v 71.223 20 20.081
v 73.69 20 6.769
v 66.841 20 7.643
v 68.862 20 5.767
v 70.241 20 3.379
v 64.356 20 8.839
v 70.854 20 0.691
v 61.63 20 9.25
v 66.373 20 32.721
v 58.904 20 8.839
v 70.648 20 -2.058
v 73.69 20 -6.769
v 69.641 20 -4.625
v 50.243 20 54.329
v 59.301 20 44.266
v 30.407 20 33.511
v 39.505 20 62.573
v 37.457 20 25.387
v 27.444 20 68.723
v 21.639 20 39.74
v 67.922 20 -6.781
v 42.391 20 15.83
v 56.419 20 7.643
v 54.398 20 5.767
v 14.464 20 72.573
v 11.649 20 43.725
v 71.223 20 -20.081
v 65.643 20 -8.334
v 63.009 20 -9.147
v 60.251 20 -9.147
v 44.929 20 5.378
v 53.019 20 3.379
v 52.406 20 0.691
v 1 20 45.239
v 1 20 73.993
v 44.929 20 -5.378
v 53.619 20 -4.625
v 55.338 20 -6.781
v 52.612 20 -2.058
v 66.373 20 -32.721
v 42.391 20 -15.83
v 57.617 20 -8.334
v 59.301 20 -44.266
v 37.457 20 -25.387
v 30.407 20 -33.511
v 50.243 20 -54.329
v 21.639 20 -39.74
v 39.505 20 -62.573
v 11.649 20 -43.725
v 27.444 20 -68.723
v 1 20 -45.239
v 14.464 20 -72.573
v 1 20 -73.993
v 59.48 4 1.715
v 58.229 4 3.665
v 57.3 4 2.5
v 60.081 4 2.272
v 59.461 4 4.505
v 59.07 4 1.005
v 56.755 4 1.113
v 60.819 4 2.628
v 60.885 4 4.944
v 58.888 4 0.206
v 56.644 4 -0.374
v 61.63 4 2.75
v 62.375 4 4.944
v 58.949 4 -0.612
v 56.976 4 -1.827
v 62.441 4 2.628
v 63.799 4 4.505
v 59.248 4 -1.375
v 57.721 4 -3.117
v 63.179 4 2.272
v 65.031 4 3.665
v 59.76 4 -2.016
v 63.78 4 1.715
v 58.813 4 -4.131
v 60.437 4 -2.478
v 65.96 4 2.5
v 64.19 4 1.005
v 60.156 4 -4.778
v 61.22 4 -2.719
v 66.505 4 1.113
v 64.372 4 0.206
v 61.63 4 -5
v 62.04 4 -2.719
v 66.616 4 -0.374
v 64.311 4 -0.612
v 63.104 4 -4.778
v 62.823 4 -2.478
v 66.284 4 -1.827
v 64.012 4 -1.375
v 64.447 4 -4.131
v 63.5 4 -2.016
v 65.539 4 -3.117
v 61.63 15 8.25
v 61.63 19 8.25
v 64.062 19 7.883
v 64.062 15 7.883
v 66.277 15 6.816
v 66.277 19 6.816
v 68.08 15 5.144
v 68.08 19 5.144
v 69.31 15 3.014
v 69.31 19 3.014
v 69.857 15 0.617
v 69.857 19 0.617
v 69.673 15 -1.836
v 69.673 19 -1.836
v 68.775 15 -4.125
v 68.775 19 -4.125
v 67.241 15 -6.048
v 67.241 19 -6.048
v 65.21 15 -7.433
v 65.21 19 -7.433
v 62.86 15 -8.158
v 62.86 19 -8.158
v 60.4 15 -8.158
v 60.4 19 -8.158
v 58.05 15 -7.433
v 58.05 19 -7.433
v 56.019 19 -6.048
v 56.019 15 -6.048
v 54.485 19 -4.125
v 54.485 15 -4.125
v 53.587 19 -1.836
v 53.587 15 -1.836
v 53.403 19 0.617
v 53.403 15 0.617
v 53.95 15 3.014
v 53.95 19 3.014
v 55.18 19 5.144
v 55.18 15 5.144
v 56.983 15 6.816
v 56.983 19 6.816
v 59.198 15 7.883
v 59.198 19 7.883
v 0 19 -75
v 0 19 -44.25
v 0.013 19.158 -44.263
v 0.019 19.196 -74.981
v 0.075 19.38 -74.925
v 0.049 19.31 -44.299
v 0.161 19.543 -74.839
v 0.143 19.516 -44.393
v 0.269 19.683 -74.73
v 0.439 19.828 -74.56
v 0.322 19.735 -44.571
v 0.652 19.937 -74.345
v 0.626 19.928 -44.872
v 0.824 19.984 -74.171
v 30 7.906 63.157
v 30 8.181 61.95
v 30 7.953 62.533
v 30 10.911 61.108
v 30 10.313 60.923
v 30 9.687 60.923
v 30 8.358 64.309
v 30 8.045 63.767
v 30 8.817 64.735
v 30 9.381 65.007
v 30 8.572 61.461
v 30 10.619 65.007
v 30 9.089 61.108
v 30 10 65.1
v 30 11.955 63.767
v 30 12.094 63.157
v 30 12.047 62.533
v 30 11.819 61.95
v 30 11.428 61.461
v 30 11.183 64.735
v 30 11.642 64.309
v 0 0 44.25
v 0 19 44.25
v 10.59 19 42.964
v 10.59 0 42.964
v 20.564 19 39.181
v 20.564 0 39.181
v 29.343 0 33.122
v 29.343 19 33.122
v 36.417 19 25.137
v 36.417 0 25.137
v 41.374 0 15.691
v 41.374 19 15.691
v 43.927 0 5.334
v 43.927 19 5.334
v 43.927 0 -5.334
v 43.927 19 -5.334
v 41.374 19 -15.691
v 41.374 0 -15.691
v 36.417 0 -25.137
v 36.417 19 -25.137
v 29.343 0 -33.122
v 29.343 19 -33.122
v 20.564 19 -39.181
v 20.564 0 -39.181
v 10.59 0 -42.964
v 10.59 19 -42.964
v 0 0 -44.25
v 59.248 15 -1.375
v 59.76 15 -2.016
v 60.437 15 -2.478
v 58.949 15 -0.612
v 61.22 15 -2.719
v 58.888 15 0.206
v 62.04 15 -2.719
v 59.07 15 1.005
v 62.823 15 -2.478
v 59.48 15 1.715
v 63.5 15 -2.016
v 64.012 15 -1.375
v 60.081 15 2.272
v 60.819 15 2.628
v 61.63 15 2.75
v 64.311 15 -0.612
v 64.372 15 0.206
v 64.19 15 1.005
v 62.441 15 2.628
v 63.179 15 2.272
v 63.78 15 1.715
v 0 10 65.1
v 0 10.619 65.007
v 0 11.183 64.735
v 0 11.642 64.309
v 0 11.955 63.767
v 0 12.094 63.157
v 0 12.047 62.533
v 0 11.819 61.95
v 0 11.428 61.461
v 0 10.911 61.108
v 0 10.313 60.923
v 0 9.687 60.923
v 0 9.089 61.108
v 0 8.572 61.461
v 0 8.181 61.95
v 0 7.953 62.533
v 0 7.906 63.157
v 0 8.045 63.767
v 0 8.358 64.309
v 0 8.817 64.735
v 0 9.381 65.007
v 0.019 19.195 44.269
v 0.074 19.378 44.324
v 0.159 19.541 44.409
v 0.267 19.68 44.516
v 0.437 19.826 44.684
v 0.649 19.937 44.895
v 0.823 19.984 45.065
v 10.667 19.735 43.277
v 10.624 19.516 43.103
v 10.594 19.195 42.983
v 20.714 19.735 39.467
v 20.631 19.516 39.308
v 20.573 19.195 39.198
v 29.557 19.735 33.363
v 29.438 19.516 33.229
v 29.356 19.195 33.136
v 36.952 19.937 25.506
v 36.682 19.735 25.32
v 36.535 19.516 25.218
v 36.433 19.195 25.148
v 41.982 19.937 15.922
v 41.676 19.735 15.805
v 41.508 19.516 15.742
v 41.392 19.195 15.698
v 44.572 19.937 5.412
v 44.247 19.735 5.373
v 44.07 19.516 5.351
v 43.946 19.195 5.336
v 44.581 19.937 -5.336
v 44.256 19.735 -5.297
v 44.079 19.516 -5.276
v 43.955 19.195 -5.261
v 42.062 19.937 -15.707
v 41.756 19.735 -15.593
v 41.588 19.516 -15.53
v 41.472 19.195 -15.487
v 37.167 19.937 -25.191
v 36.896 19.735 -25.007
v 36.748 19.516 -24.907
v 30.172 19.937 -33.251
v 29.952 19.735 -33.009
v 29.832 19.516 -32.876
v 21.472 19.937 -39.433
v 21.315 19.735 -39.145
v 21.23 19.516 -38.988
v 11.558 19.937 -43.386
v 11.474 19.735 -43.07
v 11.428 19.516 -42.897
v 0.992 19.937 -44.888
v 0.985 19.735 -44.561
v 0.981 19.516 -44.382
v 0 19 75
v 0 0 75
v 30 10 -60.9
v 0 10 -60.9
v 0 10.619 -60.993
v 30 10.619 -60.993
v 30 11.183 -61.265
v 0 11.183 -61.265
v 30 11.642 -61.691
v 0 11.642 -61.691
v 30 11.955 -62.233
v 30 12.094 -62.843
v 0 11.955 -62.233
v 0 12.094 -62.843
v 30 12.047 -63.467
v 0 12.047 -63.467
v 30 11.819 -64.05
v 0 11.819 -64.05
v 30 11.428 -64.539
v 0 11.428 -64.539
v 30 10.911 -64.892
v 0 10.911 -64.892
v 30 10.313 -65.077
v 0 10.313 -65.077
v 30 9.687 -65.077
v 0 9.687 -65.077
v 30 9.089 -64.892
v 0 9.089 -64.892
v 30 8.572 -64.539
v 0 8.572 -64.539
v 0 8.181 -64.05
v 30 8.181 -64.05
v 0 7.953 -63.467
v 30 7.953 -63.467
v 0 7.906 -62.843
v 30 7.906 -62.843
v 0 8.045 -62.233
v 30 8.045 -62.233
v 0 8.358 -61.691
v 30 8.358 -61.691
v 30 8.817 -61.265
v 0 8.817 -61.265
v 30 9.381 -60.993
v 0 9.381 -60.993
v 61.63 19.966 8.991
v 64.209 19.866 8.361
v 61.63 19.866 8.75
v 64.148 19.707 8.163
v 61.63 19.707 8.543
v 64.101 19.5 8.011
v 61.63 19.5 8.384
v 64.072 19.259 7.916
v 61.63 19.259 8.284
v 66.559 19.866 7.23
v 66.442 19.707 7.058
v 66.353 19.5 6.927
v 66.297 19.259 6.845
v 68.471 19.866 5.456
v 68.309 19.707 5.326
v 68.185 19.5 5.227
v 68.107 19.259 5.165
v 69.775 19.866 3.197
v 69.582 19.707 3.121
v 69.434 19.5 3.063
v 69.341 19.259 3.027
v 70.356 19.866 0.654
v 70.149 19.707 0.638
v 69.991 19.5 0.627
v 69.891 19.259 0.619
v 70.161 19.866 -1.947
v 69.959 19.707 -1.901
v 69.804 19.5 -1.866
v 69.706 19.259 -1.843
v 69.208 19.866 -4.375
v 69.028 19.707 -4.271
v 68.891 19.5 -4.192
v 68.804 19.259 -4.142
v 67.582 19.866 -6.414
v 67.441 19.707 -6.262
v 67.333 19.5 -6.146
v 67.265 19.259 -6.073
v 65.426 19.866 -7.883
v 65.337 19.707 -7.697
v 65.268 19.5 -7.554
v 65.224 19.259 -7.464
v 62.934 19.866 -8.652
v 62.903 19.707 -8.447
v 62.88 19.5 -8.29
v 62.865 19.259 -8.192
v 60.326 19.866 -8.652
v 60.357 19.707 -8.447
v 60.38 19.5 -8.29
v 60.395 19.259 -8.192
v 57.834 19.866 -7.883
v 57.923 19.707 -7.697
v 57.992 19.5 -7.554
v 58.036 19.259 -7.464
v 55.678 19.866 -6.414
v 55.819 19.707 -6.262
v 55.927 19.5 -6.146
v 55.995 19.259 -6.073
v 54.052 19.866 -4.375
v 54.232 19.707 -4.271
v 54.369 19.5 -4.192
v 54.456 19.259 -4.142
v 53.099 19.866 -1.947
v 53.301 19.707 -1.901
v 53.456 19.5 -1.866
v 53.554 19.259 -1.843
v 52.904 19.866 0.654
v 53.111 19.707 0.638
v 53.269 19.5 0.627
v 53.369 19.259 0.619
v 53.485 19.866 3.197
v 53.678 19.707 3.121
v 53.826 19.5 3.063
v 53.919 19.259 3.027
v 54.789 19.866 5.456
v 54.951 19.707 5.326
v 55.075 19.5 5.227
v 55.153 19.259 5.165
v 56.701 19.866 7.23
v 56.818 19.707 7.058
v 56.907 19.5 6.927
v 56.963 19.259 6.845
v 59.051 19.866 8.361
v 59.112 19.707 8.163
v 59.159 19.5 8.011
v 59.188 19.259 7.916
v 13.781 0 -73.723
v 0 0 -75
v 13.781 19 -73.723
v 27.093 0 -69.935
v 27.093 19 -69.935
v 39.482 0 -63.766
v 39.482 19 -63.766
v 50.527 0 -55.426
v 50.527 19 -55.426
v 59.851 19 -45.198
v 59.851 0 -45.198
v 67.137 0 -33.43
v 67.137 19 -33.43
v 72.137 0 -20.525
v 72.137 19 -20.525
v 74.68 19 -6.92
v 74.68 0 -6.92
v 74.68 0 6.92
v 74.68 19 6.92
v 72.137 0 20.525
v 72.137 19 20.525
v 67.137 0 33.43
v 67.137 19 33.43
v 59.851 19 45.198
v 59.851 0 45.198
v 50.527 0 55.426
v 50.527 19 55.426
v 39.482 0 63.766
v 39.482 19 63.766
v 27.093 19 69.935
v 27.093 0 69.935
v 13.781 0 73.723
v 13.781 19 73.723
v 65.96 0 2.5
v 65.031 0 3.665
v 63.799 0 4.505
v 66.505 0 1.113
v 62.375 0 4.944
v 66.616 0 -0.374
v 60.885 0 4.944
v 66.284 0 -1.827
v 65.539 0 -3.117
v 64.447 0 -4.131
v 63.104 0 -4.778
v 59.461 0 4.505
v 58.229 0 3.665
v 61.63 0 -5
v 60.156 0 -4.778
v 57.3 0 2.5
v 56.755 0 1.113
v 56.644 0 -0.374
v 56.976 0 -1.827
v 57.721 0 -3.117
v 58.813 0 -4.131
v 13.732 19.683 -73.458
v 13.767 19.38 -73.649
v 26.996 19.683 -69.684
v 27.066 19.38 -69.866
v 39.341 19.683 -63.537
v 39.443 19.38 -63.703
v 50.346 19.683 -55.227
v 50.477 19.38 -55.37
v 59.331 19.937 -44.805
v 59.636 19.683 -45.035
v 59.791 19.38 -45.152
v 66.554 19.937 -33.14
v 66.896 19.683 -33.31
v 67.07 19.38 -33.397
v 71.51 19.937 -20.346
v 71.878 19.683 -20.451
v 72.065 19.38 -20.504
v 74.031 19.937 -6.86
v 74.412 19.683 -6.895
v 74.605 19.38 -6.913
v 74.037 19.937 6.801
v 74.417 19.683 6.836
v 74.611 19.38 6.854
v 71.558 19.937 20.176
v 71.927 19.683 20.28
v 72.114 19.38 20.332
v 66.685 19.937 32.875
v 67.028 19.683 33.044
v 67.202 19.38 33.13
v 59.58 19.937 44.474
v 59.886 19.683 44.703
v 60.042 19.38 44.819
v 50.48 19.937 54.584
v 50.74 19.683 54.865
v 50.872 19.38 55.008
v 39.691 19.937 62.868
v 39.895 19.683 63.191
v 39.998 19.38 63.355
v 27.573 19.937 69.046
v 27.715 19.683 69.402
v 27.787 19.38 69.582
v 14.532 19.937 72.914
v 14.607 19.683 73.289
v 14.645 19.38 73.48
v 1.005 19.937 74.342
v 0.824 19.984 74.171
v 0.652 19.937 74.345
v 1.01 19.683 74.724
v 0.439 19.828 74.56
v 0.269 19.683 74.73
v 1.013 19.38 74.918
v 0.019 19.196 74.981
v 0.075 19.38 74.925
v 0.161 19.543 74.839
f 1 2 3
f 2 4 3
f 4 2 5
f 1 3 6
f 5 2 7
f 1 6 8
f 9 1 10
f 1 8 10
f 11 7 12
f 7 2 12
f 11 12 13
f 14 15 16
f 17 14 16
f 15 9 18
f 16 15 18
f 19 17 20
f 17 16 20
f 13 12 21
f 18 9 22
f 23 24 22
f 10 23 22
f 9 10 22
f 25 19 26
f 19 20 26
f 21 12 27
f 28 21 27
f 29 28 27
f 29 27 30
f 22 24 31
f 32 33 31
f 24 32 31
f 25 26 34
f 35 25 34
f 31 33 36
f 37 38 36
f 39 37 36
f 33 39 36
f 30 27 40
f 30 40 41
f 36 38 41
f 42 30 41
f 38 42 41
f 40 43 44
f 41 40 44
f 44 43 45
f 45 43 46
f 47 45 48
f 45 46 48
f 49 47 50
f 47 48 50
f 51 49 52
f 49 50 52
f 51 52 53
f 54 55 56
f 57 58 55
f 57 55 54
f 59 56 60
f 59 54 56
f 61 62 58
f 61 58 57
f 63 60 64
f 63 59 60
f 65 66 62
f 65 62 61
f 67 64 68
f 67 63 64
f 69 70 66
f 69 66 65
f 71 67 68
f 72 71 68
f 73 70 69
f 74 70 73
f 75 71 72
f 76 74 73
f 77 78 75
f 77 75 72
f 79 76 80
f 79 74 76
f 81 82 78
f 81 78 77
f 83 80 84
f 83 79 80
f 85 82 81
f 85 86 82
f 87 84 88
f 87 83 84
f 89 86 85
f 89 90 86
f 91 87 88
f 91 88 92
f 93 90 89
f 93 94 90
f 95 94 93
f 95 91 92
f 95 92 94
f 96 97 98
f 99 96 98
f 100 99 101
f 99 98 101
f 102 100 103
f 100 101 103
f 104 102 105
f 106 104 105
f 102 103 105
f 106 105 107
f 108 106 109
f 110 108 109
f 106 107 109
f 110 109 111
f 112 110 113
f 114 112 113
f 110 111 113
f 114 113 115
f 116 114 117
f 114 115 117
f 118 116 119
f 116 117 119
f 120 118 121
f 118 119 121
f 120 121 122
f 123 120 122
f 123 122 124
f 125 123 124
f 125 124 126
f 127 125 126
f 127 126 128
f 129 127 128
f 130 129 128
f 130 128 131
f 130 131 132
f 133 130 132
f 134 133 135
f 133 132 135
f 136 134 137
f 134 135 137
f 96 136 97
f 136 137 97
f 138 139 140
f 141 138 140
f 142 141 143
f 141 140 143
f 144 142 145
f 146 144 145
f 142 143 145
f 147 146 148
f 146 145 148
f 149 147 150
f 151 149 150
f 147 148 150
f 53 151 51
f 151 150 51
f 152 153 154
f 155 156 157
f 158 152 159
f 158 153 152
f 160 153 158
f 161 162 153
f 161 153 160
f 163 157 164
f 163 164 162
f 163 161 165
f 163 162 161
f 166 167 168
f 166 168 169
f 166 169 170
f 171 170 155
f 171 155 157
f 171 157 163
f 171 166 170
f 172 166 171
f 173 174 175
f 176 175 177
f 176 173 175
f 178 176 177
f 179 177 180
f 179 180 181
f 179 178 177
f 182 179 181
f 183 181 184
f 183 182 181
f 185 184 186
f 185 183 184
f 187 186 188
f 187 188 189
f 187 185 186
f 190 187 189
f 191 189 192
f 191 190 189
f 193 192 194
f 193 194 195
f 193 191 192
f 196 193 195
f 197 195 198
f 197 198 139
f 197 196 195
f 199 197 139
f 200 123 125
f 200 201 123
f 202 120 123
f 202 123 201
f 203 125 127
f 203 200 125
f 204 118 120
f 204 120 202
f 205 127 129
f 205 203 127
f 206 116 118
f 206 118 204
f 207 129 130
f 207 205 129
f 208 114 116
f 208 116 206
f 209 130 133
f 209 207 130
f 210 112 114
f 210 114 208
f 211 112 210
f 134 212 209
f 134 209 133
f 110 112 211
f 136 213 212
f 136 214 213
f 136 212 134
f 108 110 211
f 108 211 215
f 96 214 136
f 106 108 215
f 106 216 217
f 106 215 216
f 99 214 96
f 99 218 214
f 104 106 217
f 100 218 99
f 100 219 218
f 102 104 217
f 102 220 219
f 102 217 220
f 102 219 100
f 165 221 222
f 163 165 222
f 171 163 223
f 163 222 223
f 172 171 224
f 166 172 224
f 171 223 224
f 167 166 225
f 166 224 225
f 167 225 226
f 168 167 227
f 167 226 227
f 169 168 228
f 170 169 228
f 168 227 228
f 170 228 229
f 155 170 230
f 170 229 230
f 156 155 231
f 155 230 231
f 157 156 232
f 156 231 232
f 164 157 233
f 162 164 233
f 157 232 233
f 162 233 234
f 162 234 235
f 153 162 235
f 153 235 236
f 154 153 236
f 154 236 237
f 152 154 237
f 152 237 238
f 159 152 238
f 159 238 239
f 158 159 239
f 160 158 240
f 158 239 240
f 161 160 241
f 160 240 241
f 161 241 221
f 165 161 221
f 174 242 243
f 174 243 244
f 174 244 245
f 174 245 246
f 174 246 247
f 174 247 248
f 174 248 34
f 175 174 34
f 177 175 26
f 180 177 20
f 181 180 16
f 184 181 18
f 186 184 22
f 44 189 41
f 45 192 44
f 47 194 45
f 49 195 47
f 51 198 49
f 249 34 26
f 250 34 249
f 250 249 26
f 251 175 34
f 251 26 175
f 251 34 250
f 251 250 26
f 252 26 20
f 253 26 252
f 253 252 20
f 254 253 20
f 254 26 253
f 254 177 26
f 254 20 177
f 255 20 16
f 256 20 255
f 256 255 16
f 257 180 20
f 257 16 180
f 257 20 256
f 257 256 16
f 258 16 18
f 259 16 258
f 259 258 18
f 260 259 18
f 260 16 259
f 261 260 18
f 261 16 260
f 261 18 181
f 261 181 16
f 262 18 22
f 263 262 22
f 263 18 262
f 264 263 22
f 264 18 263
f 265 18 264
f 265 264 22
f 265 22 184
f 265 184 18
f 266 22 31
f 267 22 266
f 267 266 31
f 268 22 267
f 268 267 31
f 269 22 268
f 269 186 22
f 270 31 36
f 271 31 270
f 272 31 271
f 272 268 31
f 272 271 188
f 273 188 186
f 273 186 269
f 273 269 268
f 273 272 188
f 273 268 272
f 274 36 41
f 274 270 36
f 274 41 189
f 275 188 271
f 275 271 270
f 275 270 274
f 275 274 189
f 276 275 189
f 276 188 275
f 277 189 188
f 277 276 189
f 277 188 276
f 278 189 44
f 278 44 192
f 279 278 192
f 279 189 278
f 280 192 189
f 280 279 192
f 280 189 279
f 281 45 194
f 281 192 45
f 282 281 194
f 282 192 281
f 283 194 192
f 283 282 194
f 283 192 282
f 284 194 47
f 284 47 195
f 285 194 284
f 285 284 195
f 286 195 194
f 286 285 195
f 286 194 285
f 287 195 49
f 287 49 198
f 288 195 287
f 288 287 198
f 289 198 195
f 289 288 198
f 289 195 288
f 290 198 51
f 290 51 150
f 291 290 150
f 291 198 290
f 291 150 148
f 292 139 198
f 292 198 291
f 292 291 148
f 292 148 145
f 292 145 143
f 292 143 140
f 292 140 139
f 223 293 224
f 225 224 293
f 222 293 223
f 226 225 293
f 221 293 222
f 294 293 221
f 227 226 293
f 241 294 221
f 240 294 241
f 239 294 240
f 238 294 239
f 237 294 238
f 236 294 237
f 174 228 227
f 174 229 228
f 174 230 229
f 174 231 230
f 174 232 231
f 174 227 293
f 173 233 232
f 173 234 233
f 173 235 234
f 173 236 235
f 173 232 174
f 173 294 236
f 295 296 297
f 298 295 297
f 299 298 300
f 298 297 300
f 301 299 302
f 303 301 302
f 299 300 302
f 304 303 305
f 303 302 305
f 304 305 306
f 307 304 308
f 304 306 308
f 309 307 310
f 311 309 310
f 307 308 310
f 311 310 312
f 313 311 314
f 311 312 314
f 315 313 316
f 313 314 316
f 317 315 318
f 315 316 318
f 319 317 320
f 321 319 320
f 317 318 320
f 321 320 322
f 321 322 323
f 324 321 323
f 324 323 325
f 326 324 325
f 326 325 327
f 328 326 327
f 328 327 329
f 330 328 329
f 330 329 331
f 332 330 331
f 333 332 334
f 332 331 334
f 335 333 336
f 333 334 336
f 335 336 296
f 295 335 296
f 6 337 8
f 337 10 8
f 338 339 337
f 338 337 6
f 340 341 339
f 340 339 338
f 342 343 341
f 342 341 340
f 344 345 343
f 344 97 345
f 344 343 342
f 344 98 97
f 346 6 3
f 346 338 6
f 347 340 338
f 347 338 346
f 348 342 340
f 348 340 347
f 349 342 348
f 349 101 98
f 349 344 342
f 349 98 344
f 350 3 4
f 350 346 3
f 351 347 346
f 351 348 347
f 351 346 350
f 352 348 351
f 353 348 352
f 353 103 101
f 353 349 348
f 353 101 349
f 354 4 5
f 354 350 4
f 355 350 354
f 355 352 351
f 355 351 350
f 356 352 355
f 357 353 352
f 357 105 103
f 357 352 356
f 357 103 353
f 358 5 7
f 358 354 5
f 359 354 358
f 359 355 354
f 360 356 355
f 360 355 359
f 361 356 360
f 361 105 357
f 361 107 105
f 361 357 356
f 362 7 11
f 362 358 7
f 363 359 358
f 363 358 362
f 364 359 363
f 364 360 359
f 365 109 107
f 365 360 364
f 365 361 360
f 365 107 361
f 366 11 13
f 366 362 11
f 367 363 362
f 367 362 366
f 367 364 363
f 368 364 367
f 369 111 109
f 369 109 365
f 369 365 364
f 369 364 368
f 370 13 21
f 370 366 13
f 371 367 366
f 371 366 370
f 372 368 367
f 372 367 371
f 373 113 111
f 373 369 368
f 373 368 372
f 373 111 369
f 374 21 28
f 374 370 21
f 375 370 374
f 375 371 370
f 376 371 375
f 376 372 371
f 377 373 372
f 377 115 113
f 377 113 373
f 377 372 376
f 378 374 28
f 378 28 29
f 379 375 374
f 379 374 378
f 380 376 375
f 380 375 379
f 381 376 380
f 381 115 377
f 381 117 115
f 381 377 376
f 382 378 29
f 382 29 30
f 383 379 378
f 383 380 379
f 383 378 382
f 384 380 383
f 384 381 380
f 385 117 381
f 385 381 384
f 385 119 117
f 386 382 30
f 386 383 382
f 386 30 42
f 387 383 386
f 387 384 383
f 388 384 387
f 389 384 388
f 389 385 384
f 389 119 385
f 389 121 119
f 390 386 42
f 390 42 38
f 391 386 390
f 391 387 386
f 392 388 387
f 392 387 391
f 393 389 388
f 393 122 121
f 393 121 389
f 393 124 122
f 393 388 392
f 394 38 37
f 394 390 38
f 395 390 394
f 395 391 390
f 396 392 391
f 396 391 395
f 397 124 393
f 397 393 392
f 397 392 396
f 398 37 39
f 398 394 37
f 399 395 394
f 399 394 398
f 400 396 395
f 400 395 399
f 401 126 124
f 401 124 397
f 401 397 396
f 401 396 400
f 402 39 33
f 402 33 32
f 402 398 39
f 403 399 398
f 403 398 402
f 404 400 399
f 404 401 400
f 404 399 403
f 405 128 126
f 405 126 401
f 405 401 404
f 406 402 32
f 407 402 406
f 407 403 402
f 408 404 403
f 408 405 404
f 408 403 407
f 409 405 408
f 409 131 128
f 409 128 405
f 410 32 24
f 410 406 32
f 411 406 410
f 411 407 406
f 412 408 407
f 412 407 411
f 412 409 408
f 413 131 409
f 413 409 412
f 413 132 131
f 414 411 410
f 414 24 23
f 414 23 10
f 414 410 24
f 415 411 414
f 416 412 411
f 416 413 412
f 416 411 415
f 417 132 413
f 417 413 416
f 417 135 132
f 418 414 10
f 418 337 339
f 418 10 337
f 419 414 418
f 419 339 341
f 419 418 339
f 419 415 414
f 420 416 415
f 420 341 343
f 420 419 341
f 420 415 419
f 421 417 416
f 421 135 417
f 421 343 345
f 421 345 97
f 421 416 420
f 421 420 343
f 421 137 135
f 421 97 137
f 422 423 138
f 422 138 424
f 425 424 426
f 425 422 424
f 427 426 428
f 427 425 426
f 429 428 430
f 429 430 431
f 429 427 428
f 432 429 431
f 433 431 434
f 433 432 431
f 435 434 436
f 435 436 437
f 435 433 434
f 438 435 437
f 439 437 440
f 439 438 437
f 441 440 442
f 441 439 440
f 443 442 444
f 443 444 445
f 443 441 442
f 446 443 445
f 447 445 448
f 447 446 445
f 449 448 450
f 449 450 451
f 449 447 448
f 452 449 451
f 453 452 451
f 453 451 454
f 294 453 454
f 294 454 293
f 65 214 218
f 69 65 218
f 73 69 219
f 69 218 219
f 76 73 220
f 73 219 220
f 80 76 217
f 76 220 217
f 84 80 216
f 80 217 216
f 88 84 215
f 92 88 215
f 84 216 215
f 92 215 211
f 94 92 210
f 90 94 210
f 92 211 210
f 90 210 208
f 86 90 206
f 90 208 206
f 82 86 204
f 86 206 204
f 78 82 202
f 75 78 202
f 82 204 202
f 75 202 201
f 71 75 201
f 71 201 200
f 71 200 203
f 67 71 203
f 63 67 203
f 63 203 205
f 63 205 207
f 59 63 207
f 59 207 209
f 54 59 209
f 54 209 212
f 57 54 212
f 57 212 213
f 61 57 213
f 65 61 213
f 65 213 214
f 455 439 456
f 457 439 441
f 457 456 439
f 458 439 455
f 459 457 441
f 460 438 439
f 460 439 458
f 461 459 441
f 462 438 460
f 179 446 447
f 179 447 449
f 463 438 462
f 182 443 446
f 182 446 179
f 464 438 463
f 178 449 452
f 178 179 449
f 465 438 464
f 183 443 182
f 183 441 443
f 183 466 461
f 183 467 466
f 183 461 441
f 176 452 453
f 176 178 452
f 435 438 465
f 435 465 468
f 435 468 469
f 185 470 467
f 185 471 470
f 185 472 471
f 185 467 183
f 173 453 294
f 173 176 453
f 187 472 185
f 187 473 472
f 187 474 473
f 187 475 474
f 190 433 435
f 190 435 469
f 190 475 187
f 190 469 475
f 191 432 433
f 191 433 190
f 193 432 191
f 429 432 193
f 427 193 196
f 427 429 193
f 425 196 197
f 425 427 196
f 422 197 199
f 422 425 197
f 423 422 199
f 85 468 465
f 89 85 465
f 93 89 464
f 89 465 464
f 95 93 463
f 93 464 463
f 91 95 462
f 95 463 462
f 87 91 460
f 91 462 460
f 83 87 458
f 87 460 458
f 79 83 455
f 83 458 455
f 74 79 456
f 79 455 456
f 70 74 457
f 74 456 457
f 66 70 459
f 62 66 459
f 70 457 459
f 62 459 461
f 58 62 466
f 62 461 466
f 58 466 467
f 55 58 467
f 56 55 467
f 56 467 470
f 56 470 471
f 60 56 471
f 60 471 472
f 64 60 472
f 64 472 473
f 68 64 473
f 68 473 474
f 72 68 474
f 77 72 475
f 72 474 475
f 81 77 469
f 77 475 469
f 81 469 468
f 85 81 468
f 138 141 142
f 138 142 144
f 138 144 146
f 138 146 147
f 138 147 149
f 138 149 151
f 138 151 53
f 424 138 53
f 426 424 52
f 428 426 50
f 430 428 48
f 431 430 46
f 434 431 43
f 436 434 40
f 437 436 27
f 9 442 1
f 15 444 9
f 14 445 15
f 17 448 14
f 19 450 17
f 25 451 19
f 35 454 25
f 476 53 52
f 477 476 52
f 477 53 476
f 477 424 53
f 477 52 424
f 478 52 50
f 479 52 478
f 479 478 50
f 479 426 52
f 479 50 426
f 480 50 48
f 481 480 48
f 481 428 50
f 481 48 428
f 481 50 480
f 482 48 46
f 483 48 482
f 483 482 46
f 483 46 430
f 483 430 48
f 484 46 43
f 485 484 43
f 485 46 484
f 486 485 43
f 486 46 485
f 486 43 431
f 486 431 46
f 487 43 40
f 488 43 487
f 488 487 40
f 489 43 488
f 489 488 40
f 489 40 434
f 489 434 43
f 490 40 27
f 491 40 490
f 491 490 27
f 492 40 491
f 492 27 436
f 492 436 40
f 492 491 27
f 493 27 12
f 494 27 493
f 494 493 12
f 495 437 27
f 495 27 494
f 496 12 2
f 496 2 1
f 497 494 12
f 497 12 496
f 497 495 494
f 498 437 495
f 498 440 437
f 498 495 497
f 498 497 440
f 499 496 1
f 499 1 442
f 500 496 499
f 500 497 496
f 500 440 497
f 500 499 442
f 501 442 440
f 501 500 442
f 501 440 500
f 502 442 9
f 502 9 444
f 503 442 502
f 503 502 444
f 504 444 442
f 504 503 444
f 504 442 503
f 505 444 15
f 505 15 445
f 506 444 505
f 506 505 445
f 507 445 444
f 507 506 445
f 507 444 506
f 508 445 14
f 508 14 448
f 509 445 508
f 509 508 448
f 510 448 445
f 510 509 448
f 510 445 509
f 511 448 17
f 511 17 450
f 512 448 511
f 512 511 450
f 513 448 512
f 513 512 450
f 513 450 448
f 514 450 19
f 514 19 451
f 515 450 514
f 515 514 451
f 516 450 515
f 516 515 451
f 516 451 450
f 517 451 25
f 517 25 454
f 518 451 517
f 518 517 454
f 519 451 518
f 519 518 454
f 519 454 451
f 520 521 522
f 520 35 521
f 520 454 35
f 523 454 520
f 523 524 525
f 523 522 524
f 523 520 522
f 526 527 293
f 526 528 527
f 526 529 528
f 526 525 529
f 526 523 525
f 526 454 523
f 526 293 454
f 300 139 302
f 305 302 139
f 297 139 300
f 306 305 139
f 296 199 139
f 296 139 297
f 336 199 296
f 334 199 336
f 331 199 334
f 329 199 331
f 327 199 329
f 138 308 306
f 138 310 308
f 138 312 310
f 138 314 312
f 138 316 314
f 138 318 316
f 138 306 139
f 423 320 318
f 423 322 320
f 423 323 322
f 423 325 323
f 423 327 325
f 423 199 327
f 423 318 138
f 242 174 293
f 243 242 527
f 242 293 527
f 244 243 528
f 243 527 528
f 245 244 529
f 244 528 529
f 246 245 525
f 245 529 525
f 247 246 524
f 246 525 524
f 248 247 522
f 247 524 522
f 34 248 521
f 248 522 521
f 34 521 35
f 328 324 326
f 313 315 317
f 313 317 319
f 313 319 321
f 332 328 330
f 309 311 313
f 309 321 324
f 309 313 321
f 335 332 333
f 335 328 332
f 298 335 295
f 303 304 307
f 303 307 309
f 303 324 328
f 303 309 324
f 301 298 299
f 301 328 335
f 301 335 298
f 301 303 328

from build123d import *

# Parameters (mm, degrees)
BOSS_EXTRUDE1_DEPTH = 20
SKETCH3_R           = 2.1
CUT_EXTRUDE2_DEPTH  = 30
SKETCH4_R           = 8.25
CUT_EXTRUDE3_DEPTH  = 5
FILLET1_R           = 1
FILLET2_R           = 1
FILLET3_R           = 1
SKETCH5_R           = 2.75
CUT_EXTRUDE4_DEPTH  = 20
SKETCH6_R           = 5
CUT_EXTRUDE5_DEPTH  = 4


with BuildPart() as part:
    # Sketch1 → Boss-Extrude1 (new body)
    with BuildSketch(Plane(origin=(0, 0, 0), x_dir=(1, 0, 0), z_dir=(0, 1, 0))):
        with BuildLine():
            Line((0, 44.25), (0, 75))
            ThreePointArc((0, 75), (75, 0), (0, -75))
            Line((0, -75), (0, -44.25))
            ThreePointArc((0, -44.25), (44.25, 0), (0, 44.25))
        make_face()
    extrude(amount=BOSS_EXTRUDE1_DEPTH)

    # Sketch3 → Cut-Extrude2 (cut)
    with BuildSketch(Plane.ZY):
        with Locations((-63, 10)):
            Circle(SKETCH3_R)
        with Locations((63, 10)):
            Circle(SKETCH3_R)
    extrude(amount=-CUT_EXTRUDE2_DEPTH, mode=Mode.SUBTRACT)

    # Sketch4 → Cut-Extrude3 (cut)
    with BuildSketch(Plane(origin=(0, 20, 0), x_dir=(1, 0, 0), z_dir=(0, 1, 0))):
        with Locations(Location((61.63, 0, 0), (0, 0, 270))):
            Circle(SKETCH4_R)
    extrude(amount=-CUT_EXTRUDE3_DEPTH, mode=Mode.SUBTRACT)

    # Fillet1
    fillet1_edges = [part.edges().sort_by_distance(p)[0] for p in [
        (61.63, 20, -8.25),
    ]]
    fillet(fillet1_edges, radius=FILLET1_R)

    # Fillet2
    fillet2_edges = [part.edges().sort_by_distance(p)[0] for p in [
        (44.25, 20, 0),
    ]]
    fillet(fillet2_edges, radius=FILLET2_R)

    # Fillet3
    # the kernel refuses this fillet: 1 mm, written as the material it takes off along each edge
    with BuildSketch(Plane(origin=(0, 20, -42.75), x_dir=(1, 0, 0), z_dir=(0, 0, -1)), Plane(origin=(0, 20, 77.5), x_dir=(1, 0, 0), z_dir=(0, 0, -1))) as fillet3_piece_1:
        with BuildLine():
            CenterArc((FILLET3_R, FILLET3_R), FILLET3_R, 180, 90)
            Line((0, FILLET3_R), (0, 0))
            Line((0, 0), (FILLET3_R, 0))
        make_face()
    extrude(amount=34.75, mode=Mode.SUBTRACT)
    with BuildSketch(Plane(origin=(0, 20, 0), x_dir=(-0.033380737313120155, 0, -0.9994427079009744), z_dir=(-0.9994427079009744, 0, 0.033380737313120155))) as fillet3_piece_2:
        with BuildLine():
            CenterArc((75 - FILLET3_R, FILLET3_R), FILLET3_R, 270, 90)
            Line((75, FILLET3_R), (75, 0))
            Line((75, 0), (75 - FILLET3_R, 0))
        make_face()
    revolve(axis=Axis((0, 20, 0), (0, -1, 0)), revolution_arc=183.825861464, mode=Mode.SUBTRACT)

    # Sketch5 → Cut-Extrude4 (cut)
    with BuildSketch(Plane(origin=(0, 15, 0), x_dir=(1, 0, 0), z_dir=(0, 1, 0))):
        with Locations(Location((61.63, 0, 0), (0, 0, 270))):
            Circle(SKETCH5_R)
    extrude(amount=-CUT_EXTRUDE4_DEPTH, mode=Mode.SUBTRACT)

    # Sketch6 → Cut-Extrude5 (cut)
    with BuildSketch(Plane.XZ):
        with Locations(Location((61.63, 0, 0), (0, 0, 270))):
            Circle(SKETCH6_R)
    extrude(amount=-CUT_EXTRUDE5_DEPTH, mode=Mode.SUBTRACT)


solid = part.part
